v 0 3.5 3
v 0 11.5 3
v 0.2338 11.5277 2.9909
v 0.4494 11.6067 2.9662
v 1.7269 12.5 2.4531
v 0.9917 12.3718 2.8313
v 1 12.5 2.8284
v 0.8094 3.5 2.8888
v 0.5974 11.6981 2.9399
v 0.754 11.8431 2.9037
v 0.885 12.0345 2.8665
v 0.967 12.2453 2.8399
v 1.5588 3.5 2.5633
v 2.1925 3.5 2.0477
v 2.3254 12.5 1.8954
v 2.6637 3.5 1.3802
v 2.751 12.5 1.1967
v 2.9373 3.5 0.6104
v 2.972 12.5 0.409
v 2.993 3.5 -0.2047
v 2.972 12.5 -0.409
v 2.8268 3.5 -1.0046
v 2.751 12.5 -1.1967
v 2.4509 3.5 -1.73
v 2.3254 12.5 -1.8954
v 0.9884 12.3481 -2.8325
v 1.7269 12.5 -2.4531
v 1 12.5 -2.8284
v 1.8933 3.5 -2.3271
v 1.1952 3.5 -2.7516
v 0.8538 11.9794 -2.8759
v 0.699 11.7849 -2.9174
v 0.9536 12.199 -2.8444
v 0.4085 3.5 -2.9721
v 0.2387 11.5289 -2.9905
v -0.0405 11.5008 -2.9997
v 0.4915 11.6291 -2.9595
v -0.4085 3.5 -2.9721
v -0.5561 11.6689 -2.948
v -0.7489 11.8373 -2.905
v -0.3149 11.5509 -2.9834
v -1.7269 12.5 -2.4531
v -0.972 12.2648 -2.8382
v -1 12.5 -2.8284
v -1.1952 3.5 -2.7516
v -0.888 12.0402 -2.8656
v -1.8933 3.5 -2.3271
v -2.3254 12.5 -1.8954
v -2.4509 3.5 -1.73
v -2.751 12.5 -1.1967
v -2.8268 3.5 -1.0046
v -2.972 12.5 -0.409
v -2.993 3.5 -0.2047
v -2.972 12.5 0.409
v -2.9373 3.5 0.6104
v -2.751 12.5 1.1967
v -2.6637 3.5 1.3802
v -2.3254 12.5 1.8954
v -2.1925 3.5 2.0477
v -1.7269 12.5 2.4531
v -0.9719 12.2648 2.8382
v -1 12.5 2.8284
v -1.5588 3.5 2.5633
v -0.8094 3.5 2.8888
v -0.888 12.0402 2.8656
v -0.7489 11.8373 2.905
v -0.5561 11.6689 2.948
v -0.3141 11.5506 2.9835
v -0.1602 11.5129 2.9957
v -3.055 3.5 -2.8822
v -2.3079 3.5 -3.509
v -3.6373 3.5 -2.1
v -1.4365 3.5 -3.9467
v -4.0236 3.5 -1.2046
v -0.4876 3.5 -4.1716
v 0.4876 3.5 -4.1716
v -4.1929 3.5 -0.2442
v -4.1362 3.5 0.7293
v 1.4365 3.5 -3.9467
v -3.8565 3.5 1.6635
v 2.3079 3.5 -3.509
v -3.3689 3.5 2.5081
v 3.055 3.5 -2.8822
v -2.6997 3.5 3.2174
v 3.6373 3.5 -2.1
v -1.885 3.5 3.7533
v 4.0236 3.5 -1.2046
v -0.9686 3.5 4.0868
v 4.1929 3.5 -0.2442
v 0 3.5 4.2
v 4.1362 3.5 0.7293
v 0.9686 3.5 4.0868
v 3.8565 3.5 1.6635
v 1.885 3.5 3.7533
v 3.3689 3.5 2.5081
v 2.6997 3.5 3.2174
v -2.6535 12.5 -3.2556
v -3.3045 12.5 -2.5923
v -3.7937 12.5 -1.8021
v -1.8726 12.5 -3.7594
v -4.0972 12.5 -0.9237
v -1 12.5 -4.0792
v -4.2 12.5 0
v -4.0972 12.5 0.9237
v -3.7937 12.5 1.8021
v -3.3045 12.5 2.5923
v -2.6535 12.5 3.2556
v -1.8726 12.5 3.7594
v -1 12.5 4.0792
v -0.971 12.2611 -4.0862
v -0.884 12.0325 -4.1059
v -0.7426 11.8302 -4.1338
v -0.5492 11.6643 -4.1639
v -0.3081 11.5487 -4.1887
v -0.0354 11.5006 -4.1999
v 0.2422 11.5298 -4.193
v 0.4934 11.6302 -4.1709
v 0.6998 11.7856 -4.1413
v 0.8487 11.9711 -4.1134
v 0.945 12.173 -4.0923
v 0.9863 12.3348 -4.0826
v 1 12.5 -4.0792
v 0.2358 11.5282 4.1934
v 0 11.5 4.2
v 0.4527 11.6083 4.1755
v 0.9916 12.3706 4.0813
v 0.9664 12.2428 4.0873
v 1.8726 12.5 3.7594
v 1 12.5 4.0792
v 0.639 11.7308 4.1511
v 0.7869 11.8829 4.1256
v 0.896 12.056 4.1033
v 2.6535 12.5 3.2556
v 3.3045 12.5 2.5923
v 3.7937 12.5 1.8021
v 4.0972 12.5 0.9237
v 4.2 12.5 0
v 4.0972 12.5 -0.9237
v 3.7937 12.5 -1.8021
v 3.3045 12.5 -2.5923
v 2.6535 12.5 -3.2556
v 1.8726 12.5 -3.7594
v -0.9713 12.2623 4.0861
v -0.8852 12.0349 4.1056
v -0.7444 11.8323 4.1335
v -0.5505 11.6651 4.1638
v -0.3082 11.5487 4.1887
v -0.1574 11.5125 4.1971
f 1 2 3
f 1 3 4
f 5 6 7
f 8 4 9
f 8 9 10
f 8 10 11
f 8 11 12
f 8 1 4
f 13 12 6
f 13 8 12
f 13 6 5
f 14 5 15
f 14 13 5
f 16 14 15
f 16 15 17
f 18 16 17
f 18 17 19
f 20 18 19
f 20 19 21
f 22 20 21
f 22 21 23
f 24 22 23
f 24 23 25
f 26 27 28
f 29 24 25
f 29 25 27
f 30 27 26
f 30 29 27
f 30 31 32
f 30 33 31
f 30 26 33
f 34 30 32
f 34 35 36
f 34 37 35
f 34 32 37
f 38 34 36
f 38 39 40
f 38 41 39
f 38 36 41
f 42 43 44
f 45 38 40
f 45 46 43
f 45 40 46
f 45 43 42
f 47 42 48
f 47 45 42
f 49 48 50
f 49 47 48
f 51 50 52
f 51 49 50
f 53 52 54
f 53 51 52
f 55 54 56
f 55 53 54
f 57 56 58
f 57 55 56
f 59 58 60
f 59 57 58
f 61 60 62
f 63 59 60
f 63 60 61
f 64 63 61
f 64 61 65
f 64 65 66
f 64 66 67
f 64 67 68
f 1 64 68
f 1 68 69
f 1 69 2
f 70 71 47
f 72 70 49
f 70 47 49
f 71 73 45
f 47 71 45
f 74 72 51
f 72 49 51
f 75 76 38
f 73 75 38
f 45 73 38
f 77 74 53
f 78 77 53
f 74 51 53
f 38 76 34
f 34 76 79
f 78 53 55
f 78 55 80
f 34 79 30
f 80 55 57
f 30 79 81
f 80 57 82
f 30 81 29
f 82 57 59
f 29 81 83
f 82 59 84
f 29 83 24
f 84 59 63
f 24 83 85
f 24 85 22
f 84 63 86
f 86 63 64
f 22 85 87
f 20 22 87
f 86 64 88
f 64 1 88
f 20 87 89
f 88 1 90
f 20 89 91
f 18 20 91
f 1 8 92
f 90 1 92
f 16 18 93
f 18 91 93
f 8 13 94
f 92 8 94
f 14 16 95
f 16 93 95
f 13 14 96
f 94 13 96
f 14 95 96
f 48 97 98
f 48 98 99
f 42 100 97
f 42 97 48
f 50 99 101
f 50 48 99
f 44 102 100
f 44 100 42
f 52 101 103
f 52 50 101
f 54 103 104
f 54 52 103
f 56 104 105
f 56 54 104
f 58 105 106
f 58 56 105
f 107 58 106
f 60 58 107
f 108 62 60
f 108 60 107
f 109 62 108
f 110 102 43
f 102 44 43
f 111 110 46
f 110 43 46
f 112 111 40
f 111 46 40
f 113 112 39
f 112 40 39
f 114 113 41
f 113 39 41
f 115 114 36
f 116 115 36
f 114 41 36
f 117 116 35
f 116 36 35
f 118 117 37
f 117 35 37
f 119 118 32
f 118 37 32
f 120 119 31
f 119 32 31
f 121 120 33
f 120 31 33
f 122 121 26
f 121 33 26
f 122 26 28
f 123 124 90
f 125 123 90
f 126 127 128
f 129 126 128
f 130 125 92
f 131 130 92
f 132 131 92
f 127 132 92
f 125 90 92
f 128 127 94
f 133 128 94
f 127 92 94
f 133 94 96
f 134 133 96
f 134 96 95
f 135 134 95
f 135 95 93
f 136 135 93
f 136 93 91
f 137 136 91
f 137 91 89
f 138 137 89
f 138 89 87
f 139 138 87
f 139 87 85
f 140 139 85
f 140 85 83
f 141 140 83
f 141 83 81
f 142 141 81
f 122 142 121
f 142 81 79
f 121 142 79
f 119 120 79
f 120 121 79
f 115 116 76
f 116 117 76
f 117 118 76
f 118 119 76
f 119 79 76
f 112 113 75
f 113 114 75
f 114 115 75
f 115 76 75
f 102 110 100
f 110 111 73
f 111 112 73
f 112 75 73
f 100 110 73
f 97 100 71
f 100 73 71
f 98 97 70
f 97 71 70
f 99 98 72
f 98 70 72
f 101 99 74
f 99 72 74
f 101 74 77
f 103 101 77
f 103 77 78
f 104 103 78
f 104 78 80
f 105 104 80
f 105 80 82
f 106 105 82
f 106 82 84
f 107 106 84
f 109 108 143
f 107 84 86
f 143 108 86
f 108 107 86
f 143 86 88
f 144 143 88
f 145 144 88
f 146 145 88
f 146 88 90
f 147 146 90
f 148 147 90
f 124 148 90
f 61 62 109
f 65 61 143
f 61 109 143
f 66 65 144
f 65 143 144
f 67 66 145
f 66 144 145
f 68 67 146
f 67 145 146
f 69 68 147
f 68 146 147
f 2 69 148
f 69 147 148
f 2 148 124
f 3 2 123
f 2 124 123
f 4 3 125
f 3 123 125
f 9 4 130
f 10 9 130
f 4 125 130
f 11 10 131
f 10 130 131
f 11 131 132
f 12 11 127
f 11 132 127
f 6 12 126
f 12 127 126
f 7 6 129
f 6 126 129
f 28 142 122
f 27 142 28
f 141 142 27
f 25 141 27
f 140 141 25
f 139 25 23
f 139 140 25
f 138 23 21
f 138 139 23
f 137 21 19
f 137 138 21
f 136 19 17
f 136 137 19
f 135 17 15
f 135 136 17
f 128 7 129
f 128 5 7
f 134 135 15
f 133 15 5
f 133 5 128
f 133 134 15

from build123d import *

# Parameters (mm, degrees)
SKETCH_1_R          = 4.2
SKETCH_1_R_2        = 3
EXTRUDE_1_DEPTH     = 13.5
CUT_EXTRUDE_START   = -1
SKETCH_3_R          = 4.2
CUT_EXTRUDE_3_DEPTH = 1
SKETCH_4_R          = 1
CUT_EXTRUDE_4_DEPTH = 50
MOVE_FACE_1_BY      = 3.5


with BuildPart() as part:
    # ｽｹｯﾁ1 → ﾎﾞｽ - 押し出し1 (new body)
    with BuildSketch(Plane(origin=(0, 0, 0), x_dir=(1, 0, 0), z_dir=(0, 1, 0))):
        with Locations(Location((0, 0, 0), (0, 0, 270))):
            Circle(SKETCH_1_R)
        with Locations(Location((0, 0, 0), (0, 0, 270))):
            Circle(SKETCH_1_R_2, mode=Mode.SUBTRACT)
    extrude(amount=EXTRUDE_1_DEPTH)

    # ｽｹｯﾁ3 → ｶｯﾄ - 押し出し3 (cut)
    with BuildSketch(Plane(origin=(0, 13.5, 0), x_dir=(1, 0, 0), z_dir=(0, 1, 0)).offset(CUT_EXTRUDE_START)):
        with Locations(Location((0, 0, 0), (0, 0, 270))):
            Circle(SKETCH_3_R)
    extrude(amount=CUT_EXTRUDE_3_DEPTH, mode=Mode.SUBTRACT)

    # ｽｹｯﾁ4 → ｶｯﾄ - 押し出し4 (cut, symmetric)
    with BuildSketch(Plane.XY):
        with Locations((0, 12.5)):
            Circle(SKETCH_4_R)
    extrude(amount=CUT_EXTRUDE_4_DEPTH, both=True, mode=Mode.SUBTRACT)

    # Move Face 1: a face moved inward by 3.5
    extrude(part.faces().sort_by_distance((0, 0, 3.36))[0], amount=MOVE_FACE_1_BY, dir=(0, 1, 0), mode=Mode.SUBTRACT)


solid = part.part
